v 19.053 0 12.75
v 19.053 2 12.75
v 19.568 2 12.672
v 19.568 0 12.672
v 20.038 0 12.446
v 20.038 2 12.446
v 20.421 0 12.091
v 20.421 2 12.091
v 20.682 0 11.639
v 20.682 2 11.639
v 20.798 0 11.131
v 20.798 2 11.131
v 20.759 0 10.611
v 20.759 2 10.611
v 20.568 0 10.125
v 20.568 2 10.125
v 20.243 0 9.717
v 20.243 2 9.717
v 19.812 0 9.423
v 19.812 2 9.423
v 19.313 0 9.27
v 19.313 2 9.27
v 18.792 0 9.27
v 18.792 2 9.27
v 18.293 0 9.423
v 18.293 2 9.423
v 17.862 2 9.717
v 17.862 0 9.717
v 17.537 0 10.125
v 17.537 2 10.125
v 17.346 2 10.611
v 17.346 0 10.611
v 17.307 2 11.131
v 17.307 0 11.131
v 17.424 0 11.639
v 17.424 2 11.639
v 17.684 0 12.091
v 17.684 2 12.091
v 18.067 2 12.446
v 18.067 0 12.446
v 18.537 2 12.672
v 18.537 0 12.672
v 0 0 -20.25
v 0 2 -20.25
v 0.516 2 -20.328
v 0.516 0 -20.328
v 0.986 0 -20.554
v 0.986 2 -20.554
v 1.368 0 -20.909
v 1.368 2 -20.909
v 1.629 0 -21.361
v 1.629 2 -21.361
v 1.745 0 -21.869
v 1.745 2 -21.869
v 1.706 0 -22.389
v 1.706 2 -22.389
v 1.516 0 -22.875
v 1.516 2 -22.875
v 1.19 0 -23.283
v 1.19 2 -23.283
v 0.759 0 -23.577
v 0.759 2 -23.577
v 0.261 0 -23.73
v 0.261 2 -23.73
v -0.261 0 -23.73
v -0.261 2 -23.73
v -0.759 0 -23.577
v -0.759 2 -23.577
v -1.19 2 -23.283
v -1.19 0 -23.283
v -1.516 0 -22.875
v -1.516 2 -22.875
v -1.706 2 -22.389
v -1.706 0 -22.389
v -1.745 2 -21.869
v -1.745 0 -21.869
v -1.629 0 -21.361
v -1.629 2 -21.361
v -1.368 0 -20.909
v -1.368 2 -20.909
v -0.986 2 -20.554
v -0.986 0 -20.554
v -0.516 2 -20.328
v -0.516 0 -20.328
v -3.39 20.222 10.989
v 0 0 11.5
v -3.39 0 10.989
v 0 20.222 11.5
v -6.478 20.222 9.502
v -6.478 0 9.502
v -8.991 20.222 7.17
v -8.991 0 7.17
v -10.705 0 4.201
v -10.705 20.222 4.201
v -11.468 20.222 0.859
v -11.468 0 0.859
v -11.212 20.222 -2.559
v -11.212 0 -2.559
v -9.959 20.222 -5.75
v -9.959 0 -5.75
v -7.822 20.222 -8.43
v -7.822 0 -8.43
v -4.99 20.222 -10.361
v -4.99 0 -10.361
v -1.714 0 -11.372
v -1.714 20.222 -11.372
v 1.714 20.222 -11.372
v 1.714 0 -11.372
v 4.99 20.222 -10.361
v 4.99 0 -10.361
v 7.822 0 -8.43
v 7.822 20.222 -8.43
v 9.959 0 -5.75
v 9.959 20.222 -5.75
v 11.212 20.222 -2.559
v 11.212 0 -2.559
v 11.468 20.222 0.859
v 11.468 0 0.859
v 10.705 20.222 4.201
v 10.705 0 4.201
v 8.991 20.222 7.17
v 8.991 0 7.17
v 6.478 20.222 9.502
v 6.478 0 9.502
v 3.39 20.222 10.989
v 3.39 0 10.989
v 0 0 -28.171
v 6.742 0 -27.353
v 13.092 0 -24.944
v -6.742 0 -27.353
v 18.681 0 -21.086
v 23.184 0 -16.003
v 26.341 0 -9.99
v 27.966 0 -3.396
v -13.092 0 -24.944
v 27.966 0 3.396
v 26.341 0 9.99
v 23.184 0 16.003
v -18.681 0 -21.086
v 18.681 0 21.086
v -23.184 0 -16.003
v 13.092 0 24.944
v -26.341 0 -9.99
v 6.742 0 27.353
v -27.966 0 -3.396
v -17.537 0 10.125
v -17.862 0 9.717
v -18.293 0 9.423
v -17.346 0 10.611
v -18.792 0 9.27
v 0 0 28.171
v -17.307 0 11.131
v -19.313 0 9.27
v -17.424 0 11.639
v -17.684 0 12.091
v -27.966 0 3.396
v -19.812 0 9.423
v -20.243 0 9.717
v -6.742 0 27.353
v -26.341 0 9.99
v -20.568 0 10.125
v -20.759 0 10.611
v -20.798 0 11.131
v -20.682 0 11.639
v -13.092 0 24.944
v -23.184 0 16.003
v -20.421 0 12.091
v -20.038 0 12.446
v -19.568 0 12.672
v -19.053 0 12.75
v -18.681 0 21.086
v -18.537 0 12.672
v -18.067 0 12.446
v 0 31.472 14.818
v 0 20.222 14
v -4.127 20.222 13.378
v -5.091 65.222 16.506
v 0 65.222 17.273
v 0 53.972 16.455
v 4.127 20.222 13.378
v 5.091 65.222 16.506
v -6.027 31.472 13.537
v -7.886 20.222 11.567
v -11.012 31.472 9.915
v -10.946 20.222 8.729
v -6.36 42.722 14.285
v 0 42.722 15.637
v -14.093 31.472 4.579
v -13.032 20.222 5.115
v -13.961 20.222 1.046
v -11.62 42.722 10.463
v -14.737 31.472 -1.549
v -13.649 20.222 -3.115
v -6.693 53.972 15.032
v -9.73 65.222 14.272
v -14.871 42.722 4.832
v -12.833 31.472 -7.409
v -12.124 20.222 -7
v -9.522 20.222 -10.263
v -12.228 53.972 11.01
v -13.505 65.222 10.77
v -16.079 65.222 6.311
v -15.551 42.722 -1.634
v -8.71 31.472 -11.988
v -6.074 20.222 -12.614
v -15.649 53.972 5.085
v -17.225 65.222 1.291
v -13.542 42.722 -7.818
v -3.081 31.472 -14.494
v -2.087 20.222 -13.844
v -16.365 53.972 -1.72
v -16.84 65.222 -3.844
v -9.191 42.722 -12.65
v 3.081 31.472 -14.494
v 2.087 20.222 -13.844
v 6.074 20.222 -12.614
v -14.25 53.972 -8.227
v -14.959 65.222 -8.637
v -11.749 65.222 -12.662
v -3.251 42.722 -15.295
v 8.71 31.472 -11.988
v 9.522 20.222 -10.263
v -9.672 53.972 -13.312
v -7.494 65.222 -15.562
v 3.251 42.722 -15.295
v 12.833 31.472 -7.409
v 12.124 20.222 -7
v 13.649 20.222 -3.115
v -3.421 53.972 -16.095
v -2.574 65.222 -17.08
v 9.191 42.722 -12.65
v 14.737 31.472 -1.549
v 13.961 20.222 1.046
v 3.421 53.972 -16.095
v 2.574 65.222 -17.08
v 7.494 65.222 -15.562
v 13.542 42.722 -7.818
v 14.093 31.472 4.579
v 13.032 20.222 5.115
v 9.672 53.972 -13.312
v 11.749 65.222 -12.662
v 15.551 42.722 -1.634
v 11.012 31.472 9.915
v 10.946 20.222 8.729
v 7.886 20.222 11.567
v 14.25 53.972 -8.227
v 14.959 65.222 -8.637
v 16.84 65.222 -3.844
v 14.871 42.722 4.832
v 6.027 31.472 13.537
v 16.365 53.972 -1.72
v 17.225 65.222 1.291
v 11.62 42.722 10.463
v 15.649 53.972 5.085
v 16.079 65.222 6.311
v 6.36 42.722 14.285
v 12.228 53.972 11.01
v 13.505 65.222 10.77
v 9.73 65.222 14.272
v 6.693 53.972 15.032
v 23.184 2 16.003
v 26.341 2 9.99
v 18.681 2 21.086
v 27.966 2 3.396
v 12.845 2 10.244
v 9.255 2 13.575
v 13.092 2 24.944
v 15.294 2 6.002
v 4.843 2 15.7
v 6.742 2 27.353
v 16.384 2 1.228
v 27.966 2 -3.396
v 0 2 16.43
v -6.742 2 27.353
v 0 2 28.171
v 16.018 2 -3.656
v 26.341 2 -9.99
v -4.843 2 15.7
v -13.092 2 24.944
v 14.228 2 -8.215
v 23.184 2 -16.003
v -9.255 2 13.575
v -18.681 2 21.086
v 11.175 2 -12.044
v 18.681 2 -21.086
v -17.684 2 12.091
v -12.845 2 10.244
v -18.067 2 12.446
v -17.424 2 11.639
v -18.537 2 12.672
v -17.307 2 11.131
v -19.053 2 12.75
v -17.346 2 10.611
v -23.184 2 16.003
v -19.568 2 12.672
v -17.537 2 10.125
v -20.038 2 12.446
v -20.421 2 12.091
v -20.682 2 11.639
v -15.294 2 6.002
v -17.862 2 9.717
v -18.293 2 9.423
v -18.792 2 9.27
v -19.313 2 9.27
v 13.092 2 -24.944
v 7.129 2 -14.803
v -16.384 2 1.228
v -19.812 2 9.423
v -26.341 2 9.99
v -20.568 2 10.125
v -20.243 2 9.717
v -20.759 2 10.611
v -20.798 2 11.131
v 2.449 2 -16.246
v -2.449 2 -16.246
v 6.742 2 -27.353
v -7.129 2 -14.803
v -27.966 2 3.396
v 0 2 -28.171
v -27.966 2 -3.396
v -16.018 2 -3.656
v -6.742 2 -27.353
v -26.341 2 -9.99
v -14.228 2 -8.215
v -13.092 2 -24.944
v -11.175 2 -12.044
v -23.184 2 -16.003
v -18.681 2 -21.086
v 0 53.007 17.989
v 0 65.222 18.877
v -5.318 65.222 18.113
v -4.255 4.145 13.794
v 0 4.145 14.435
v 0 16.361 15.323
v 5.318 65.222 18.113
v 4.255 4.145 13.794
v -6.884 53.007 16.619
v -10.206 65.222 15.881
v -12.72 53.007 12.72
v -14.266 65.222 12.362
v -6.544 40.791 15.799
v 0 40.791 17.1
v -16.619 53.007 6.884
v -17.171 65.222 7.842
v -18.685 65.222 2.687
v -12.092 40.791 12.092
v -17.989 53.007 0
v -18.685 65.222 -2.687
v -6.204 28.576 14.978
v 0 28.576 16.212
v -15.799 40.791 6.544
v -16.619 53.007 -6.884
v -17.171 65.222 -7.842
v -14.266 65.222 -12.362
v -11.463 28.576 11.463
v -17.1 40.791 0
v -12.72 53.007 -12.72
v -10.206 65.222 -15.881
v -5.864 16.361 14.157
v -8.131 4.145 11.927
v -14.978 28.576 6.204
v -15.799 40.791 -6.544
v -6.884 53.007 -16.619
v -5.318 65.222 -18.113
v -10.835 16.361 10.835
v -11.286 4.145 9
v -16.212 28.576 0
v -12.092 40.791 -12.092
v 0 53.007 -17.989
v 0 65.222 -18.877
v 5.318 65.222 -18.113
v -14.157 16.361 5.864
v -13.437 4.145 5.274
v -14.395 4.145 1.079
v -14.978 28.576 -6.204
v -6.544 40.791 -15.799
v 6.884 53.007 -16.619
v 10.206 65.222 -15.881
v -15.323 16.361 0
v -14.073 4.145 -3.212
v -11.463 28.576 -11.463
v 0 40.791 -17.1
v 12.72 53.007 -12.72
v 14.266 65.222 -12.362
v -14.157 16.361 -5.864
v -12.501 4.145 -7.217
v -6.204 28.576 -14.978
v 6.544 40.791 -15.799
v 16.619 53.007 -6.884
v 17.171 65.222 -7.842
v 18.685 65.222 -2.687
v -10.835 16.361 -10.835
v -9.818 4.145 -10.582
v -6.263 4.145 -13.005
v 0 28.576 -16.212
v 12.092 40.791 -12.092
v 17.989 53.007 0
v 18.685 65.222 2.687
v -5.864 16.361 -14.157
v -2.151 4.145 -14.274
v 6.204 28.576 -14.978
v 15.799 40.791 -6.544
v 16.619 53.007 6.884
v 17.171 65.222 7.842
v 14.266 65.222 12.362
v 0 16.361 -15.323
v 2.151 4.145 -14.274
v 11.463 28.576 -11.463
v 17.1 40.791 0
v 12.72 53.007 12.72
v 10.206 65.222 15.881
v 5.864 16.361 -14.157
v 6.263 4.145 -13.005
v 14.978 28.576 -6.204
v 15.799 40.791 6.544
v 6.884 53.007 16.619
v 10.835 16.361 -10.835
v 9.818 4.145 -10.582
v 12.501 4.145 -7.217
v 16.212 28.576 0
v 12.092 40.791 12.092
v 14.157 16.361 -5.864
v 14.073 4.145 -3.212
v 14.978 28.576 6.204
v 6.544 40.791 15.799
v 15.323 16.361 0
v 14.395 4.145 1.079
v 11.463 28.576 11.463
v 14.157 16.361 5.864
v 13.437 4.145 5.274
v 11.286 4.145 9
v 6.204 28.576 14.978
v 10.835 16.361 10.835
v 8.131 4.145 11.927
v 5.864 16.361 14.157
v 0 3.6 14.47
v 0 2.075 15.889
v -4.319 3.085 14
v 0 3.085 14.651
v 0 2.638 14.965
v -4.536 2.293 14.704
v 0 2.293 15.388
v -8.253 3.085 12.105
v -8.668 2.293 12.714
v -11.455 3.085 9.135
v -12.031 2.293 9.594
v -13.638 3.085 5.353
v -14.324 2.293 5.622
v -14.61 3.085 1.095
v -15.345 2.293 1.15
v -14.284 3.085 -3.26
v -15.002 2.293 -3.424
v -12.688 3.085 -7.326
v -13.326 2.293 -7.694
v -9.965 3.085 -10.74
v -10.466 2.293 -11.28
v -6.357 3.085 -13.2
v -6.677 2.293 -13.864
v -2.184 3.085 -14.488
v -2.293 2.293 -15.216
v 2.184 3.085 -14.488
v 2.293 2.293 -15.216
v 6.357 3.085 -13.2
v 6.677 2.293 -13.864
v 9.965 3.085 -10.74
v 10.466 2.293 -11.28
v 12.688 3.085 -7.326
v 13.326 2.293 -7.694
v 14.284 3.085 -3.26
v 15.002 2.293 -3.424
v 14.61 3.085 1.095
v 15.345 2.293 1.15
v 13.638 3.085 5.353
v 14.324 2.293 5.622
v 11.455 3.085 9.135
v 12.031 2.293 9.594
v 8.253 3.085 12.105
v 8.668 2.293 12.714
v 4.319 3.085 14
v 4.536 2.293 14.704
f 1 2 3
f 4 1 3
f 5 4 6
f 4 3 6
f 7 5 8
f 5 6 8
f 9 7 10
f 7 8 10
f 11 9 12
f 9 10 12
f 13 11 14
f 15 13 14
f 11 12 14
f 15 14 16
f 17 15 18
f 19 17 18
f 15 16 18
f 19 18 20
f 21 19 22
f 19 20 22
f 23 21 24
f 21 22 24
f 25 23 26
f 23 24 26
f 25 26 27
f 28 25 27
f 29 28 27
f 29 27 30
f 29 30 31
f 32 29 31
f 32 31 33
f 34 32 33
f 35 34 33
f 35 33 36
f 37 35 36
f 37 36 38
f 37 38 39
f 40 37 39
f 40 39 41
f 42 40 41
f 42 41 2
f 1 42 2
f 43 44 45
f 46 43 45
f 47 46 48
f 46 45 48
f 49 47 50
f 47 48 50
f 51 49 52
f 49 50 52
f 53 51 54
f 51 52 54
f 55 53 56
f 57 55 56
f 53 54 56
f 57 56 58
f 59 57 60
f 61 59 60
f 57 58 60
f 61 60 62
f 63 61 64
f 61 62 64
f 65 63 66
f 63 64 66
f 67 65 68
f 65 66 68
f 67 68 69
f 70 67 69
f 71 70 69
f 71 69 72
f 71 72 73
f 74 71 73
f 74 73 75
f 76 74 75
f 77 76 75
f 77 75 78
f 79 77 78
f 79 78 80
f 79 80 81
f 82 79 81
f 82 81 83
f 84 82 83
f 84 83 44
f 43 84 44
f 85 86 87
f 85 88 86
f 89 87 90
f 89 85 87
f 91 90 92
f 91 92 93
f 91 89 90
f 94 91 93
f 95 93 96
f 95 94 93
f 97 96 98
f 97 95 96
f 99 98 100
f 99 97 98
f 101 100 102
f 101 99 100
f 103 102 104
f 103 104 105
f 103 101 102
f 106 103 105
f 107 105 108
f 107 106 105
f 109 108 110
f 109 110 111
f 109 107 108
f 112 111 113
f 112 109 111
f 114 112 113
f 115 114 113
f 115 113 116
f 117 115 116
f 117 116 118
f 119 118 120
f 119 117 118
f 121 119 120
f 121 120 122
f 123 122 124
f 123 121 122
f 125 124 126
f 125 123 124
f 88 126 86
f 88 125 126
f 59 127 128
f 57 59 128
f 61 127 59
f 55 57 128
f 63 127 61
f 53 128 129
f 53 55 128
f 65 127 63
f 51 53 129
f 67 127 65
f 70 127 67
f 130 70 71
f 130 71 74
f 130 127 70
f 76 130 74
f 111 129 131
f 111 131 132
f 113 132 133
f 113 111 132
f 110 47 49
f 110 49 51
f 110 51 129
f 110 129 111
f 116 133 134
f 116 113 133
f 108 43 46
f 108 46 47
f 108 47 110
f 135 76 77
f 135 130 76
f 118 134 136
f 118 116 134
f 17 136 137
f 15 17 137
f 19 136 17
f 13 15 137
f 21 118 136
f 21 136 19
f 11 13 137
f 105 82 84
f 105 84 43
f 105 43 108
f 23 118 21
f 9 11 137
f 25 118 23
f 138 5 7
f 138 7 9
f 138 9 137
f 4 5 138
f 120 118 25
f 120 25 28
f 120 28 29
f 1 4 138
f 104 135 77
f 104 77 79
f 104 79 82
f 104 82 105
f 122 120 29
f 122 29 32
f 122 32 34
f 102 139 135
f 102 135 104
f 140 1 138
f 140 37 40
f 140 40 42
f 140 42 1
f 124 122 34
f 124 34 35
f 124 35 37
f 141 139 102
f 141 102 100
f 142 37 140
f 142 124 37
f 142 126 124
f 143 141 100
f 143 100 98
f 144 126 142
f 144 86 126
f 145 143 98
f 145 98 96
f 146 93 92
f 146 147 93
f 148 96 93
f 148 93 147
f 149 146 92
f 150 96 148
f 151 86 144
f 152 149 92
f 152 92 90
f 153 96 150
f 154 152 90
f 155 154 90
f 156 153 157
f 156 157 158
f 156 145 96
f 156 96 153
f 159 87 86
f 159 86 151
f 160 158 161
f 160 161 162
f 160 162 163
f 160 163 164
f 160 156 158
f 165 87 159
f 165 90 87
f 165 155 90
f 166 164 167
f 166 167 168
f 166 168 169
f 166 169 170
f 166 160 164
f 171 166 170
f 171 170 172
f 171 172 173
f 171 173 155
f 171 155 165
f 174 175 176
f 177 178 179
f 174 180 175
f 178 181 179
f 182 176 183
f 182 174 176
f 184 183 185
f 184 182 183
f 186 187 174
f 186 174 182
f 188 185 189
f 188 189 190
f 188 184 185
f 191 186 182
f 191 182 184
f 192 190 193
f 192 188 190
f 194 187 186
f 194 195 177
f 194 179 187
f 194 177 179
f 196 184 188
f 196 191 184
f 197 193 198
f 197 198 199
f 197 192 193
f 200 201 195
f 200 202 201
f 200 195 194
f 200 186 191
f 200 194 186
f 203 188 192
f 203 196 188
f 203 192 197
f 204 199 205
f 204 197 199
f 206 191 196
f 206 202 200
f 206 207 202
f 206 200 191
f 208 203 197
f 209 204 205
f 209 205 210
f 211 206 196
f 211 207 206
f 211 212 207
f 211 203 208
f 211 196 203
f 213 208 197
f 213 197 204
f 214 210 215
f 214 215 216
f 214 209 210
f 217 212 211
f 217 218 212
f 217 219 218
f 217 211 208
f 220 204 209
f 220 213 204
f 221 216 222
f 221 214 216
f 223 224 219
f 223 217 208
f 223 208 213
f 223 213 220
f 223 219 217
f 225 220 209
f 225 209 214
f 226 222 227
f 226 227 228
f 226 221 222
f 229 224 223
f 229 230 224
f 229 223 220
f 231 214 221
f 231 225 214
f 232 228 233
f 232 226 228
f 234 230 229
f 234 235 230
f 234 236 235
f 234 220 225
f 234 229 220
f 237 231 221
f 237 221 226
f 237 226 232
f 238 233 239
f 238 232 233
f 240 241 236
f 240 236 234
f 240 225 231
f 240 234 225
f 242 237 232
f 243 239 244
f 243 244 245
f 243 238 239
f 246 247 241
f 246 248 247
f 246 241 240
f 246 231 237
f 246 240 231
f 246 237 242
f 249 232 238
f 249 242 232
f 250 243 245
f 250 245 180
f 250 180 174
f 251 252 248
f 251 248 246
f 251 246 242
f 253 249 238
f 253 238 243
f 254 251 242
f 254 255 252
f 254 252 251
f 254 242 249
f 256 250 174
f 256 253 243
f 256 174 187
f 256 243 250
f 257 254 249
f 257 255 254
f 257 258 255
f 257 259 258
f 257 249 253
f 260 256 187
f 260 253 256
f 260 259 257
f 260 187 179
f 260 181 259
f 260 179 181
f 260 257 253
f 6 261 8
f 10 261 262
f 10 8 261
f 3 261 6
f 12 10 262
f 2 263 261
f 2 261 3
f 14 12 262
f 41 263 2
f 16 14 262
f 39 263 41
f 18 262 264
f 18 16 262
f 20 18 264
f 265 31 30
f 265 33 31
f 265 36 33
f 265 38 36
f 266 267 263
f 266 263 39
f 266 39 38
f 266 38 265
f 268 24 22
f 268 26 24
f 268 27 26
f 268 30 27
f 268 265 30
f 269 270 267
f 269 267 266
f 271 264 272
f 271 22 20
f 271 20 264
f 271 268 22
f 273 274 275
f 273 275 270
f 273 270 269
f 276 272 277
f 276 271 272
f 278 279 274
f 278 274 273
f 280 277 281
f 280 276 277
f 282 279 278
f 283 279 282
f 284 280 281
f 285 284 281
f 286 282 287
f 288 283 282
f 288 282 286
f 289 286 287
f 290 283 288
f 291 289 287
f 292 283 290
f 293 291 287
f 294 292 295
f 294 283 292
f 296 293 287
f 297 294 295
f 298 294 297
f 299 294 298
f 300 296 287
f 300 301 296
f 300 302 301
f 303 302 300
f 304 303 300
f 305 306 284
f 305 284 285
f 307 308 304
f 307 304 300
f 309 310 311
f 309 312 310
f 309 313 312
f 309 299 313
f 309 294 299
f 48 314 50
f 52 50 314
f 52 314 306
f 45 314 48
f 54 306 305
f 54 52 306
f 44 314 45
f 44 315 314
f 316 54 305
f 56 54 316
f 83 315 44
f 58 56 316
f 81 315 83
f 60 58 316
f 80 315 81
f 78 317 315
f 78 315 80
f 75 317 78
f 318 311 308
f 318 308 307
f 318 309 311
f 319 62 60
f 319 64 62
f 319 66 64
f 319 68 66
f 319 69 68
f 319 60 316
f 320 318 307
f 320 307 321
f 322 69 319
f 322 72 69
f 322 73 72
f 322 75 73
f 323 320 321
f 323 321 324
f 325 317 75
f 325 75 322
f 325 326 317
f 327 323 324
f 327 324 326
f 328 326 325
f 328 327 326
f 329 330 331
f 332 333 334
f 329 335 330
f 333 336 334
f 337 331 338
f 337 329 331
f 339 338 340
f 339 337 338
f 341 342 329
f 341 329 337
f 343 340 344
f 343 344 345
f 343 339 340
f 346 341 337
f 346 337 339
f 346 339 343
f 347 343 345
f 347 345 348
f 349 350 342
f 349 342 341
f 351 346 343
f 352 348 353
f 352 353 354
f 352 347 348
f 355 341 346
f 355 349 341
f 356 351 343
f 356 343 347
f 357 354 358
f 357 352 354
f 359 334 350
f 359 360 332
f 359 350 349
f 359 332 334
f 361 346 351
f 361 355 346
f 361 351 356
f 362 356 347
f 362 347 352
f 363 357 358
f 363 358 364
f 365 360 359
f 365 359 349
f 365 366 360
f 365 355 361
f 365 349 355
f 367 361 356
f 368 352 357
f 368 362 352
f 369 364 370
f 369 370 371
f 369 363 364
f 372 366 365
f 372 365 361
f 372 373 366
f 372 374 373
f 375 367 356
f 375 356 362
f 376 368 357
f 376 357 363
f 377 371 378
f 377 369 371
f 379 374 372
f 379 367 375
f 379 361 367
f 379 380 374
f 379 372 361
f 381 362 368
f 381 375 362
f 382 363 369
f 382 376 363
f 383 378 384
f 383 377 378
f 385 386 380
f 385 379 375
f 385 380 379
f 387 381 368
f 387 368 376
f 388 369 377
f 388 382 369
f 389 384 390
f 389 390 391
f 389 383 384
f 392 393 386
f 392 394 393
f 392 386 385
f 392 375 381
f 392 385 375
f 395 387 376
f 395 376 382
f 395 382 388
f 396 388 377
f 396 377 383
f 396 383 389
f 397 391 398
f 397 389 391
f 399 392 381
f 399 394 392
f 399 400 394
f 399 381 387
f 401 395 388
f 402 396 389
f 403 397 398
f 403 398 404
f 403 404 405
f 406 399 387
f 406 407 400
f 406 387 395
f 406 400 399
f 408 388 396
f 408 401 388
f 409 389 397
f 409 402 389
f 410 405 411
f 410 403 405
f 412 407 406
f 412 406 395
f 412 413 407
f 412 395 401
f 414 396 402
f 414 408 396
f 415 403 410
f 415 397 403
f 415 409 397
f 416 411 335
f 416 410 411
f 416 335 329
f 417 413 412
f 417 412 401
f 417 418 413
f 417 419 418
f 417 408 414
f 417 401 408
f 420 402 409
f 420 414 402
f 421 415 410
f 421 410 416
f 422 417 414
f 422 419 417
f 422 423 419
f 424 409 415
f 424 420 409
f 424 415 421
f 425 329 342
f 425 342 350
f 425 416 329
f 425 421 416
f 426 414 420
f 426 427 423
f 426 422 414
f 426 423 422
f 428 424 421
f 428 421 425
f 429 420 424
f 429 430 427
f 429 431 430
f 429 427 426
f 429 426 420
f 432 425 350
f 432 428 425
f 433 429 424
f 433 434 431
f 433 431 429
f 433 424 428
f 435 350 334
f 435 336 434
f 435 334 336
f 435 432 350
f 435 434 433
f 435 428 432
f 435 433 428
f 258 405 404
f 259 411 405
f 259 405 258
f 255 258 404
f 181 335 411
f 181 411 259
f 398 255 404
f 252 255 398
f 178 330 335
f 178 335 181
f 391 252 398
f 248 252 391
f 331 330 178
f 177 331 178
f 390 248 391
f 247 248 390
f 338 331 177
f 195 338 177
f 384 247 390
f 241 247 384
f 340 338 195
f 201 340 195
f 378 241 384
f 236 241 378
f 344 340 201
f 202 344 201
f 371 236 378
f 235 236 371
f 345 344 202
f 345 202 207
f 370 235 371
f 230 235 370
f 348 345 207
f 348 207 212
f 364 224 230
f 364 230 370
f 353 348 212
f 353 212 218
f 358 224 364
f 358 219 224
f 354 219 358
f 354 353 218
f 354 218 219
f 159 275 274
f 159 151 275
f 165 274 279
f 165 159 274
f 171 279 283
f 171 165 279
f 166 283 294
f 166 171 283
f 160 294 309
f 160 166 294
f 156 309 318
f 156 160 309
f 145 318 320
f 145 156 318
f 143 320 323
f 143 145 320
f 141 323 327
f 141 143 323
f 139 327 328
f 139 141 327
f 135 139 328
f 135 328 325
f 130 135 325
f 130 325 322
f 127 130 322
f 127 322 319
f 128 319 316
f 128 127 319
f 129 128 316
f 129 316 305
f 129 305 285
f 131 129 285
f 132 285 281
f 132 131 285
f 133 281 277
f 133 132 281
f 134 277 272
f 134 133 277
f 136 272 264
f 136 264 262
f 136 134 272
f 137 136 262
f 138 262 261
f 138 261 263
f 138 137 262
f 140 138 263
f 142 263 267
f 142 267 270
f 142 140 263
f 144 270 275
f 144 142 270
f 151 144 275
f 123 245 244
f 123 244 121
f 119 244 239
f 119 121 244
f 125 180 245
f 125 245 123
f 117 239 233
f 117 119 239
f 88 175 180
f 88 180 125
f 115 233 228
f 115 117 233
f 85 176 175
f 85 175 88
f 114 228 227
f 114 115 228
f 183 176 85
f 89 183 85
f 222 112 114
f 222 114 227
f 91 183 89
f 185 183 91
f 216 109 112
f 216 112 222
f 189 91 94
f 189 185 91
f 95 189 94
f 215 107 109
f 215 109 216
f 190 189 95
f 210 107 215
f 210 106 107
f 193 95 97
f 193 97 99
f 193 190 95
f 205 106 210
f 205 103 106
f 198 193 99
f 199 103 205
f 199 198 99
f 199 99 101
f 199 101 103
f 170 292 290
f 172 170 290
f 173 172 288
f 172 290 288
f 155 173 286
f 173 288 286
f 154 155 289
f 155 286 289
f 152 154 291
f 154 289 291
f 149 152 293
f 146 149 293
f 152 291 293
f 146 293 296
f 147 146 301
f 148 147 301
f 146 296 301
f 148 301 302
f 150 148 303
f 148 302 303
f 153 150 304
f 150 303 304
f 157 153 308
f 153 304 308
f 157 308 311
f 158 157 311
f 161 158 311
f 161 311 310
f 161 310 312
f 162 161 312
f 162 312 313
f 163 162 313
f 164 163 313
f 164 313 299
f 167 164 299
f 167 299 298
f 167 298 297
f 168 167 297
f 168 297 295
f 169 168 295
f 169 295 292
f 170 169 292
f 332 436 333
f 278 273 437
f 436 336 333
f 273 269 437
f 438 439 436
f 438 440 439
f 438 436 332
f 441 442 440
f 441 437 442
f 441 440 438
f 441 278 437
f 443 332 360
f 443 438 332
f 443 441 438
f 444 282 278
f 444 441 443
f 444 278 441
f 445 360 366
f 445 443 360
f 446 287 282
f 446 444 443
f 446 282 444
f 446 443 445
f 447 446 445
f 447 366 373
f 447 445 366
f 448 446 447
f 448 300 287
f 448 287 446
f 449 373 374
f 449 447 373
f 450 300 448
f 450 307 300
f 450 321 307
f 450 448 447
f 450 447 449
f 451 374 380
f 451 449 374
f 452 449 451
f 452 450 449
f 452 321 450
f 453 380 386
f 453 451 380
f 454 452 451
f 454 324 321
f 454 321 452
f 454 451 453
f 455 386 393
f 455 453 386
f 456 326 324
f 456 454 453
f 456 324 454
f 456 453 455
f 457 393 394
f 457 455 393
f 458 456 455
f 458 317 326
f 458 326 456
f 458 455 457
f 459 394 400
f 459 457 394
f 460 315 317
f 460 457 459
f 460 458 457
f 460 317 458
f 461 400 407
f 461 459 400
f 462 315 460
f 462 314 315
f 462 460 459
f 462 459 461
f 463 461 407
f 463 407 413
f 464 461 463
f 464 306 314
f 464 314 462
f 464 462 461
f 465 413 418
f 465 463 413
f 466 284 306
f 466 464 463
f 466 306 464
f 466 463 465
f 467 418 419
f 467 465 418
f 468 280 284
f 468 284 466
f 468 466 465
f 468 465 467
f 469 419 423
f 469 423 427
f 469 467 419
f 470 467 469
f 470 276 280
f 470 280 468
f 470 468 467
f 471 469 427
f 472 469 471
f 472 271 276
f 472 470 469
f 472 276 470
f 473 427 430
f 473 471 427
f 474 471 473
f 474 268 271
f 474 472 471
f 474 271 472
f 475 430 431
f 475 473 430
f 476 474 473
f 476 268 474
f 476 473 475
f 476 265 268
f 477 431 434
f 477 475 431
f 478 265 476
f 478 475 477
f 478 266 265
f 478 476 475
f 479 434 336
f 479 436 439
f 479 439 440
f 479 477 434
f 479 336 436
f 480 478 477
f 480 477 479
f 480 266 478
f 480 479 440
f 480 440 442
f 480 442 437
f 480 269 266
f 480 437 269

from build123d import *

# Parameters (mm, degrees)
FILLET1_R          = 2
SKETCH2_R          = 1.75
CUT_EXTRUDE1_DEPTH = 3


with BuildPart() as part:
    # Sketch1 → Revolve1 (revolve)
    with BuildSketch(Plane.XY, mode=Mode.PRIVATE) as revolve1_sk:
        Polygon((11.5, 0), (11.5, 20.222386647), (14, 20.222386647), (17.273009701, 65.222386647), (18.877236254, 65.222386647), (14.278847703, 2), (28.171211947, 2), (28.171211947, 0), align=None)
    revolve(revolve1_sk.sketch.rotate(Axis((0, 70.073472281, 0), (0, -1, 0)), 90), axis=Axis((0, 70.073472281, 0), (0, -1, 0)))  # turned: the seam where the file's is

    # Fillet1
    fillet1_edges = [part.edges().sort_by_distance(p)[0] for p in [
        (0, 2, -14.278847703),
    ]]
    fillet(fillet1_edges, radius=FILLET1_R)

    # Sketch2 → Cut-Extrude1 (cut, through all)
    with BuildSketch(Plane(origin=(0, 2, 0), x_dir=(1, 0, 0), z_dir=(0, 1, 0))):
        with Locations(Location((0, 22, 0), (0, 0, 270))):  # turned: the seam where the file's is
            Circle(SKETCH2_R)
        with Locations(Location((19.052558883, -11, 0), (0, 0, 270))):  # turned: the seam where the file's is
            Circle(SKETCH2_R)
        with Locations(Location((-19.052558883, -11, 0), (0, 0, 270))):  # turned: the seam where the file's is
            Circle(SKETCH2_R)
    extrude(amount=-CUT_EXTRUDE1_DEPTH, mode=Mode.SUBTRACT)


solid = part.part
